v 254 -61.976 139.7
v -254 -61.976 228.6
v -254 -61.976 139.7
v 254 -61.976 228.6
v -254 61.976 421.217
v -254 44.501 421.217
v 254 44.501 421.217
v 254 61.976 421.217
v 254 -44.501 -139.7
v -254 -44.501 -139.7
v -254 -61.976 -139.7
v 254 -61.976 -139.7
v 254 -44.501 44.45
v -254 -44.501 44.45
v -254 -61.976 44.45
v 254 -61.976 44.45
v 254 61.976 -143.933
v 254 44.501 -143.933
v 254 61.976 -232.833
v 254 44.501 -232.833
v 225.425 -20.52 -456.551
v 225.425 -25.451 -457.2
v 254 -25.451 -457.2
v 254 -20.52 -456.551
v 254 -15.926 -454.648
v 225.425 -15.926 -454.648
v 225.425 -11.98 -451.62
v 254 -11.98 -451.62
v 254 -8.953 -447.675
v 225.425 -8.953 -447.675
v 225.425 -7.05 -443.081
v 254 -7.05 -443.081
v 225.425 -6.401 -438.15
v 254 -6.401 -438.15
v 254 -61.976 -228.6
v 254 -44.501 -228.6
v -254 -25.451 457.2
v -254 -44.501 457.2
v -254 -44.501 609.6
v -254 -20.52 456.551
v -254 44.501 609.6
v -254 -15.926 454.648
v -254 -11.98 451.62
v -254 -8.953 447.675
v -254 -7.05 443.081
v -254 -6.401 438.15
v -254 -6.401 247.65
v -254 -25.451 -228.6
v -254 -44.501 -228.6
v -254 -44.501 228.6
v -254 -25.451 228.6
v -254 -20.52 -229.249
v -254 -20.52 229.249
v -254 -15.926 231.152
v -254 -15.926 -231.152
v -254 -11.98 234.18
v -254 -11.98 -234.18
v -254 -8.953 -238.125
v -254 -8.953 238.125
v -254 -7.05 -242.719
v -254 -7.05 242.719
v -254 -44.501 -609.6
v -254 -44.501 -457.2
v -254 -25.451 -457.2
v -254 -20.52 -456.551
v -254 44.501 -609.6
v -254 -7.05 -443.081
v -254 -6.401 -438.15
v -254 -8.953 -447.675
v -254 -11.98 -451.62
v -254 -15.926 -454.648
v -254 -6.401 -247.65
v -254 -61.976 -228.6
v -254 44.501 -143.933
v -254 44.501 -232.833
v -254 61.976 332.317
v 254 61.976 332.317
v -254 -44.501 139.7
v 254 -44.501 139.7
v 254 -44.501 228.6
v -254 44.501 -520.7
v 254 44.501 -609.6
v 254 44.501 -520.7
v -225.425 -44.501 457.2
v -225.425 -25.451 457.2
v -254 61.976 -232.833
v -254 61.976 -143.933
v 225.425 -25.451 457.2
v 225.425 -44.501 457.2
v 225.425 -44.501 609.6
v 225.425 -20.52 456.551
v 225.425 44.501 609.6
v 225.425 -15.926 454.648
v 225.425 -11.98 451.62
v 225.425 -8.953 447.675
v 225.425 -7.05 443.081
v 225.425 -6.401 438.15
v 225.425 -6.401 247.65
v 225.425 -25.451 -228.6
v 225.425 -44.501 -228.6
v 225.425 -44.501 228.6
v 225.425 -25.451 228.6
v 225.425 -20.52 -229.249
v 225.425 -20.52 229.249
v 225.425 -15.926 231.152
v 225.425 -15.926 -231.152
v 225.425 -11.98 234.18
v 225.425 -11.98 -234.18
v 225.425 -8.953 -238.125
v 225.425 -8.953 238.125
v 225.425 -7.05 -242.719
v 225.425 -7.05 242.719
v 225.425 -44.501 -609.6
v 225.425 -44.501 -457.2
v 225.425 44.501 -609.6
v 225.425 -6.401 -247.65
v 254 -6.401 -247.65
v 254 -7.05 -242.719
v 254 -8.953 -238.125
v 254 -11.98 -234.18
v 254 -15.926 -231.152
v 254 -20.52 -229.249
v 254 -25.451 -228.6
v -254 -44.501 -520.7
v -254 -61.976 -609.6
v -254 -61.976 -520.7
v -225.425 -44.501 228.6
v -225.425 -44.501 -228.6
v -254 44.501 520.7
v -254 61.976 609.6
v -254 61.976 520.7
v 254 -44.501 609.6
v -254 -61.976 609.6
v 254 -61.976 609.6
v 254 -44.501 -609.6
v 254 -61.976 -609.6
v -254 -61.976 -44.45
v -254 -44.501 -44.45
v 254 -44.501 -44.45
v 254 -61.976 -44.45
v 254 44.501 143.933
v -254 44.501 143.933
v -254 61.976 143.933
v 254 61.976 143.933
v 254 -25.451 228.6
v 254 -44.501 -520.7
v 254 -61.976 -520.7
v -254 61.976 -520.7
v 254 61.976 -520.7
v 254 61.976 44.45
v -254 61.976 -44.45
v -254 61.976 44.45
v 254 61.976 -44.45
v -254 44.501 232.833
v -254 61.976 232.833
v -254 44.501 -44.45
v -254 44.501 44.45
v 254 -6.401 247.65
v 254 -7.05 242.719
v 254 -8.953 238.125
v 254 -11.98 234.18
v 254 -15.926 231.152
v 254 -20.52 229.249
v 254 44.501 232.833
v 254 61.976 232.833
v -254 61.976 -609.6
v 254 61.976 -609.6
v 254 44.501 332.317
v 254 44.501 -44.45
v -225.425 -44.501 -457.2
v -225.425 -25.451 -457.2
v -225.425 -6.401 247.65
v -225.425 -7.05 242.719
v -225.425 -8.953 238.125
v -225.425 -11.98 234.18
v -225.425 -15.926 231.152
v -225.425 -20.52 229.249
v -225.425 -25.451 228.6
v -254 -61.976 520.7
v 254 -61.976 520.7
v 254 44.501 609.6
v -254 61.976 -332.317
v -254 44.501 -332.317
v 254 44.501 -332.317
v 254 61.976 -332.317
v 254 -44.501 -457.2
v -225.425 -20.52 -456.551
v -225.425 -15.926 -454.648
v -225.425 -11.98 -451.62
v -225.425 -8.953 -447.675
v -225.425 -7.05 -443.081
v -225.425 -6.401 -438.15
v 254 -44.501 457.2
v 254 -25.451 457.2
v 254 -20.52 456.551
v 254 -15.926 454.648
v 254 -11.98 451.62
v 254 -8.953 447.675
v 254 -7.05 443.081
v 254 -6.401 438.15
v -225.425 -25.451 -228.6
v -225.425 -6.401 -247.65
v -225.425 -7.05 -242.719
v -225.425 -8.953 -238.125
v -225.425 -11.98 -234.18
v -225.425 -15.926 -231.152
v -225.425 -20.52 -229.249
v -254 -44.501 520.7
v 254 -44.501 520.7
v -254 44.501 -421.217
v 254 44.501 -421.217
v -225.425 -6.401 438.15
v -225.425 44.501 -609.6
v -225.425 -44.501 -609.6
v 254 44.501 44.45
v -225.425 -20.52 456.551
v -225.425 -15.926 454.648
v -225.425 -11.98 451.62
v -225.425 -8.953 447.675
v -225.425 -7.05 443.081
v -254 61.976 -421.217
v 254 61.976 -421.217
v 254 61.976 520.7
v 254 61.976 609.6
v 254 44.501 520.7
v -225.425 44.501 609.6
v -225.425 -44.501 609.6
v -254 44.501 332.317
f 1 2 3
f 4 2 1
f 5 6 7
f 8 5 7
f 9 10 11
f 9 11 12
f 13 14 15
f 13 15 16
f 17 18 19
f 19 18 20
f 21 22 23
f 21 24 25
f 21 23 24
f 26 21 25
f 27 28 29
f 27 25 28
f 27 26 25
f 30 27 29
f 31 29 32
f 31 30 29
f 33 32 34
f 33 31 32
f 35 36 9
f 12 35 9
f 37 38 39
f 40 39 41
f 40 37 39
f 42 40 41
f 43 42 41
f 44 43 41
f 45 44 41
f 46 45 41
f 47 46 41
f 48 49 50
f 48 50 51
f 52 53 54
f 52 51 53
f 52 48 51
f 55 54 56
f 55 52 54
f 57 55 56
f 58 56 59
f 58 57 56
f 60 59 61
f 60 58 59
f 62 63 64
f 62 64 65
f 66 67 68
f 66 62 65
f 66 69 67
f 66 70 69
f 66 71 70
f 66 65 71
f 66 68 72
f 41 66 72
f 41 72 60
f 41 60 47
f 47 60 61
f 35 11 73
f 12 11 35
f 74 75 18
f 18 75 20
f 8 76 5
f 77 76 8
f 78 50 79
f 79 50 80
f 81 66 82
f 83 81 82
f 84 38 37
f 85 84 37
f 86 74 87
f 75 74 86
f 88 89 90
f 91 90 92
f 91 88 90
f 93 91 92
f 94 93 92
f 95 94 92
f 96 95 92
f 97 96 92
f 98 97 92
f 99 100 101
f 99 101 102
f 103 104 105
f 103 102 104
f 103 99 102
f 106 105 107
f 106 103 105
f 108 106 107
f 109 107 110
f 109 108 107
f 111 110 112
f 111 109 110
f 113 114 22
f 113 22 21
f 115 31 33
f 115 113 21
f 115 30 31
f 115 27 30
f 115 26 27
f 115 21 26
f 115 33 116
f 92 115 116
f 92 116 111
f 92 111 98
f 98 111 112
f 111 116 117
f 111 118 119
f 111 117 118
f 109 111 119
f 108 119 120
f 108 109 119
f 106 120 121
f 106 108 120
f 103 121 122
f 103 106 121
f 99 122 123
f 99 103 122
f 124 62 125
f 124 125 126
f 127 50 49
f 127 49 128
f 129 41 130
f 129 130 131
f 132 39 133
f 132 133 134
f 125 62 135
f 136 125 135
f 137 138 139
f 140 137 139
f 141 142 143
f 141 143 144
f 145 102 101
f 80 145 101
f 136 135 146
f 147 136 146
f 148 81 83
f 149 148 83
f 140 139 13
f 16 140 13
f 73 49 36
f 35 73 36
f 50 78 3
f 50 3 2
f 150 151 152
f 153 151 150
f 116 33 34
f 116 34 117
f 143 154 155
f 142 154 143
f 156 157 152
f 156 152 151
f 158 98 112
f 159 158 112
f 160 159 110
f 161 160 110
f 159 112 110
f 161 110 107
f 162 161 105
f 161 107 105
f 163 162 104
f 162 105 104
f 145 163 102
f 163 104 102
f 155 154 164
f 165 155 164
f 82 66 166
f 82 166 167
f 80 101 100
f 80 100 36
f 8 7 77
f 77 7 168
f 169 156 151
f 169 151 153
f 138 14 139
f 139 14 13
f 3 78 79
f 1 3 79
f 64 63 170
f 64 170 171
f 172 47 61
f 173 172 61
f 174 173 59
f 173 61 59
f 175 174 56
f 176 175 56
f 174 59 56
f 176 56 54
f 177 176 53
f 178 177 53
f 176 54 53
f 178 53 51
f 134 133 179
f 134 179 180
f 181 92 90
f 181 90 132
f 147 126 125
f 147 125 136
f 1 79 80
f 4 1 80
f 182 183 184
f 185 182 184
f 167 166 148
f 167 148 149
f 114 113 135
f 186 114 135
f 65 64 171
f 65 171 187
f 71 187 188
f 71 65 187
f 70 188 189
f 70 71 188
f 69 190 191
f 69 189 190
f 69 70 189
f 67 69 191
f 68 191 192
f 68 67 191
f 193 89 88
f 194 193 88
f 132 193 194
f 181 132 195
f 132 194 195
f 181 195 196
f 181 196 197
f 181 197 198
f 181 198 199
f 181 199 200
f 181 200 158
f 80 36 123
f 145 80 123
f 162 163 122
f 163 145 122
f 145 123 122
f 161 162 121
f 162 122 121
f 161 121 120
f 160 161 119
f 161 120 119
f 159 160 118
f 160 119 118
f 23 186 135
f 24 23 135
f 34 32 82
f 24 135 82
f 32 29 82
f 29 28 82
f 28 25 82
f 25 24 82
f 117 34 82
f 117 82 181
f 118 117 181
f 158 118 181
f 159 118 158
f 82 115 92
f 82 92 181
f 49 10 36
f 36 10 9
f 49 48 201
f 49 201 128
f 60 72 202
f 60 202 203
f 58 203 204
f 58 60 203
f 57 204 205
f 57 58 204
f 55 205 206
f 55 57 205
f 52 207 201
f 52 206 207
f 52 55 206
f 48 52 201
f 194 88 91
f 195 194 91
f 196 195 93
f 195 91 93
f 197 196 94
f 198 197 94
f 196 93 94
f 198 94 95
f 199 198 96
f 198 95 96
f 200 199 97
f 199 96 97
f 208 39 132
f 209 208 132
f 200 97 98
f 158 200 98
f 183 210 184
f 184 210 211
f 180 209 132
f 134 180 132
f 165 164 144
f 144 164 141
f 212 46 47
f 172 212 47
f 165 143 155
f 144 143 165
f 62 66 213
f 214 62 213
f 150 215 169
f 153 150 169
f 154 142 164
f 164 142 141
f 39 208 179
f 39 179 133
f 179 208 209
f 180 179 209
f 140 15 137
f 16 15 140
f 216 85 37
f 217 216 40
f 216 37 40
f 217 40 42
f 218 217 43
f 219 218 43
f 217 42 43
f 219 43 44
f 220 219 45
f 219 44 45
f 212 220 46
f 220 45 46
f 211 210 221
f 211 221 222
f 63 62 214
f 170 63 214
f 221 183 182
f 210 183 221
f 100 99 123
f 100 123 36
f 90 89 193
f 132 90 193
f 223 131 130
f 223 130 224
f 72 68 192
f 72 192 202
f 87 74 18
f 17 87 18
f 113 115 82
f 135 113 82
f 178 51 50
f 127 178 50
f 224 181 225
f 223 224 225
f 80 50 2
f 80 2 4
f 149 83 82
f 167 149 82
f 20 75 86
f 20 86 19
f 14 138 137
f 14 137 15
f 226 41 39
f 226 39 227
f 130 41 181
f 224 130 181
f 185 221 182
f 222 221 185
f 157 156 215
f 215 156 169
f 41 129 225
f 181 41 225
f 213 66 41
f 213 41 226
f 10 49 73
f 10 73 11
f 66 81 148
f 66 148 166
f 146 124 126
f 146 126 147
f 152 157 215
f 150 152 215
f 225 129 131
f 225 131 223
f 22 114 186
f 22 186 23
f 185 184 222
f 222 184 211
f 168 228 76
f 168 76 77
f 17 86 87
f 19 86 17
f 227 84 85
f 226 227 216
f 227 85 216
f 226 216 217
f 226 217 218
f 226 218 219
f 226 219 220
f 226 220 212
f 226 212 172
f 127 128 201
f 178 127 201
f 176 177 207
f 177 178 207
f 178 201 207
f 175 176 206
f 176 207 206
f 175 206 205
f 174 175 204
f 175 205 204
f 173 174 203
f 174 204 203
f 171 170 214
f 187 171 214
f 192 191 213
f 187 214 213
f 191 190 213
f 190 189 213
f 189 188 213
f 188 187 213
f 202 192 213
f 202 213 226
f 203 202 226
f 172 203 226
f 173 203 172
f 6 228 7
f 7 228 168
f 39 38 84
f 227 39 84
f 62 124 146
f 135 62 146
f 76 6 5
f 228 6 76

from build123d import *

# Parameters (mm, degrees)
BOSS_EXTRUDE1_DEPTH        = 609.6
BOSS_EXTRUDE1_DEPTH_BACK   = 609.6
SKETCH3_W                  = 28.575
SKETCH3_H                  = 89.0016
BOSS_EXTRUDE1_2_DEPTH      = 609.6
BOSS_EXTRUDE1_2_DEPTH_BACK = 609.6
SKETCH4_W                  = 508
SKETCH4_H                  = 88.9
BOSS_EXTRUDE2_DEPTH        = 17.4752
BOSS_EXTRUDE2_2_DEPTH      = 17.4752
BOSS_EXTRUDE2_3_DEPTH      = 17.4752
BOSS_EXTRUDE2_4_DEPTH      = 17.4752
BOSS_EXTRUDE2_5_DEPTH      = 17.4752
BOSS_EXTRUDE2_6_DEPTH      = 17.4752
BOSS_EXTRUDE2_7_DEPTH      = 17.4752
SKETCH5_W                  = 508
SKETCH5_H                  = 88.9
BOSS_EXTRUDE3_DEPTH        = 17.4752
BOSS_EXTRUDE3_2_DEPTH      = 17.4752
BOSS_EXTRUDE3_3_DEPTH      = 17.4752
BOSS_EXTRUDE3_4_DEPTH      = 17.4752
BOSS_EXTRUDE3_5_DEPTH      = 17.4752
CUT_EXTRUDE2_DEPTH         = 796.93792759
CUT_EXTRUDE2_DEPTH_BACK    = 796.93792759


with BuildPart() as part:
    # Sketch3 → Boss-Extrude1 (new, two sides: drawn at the far end of the back side and taken through both)
    with BuildSketch(Plane.XY.offset(-BOSS_EXTRUDE1_DEPTH_BACK)):
        with Locations((-239.7125, 0)):
            Rectangle(SKETCH3_W, SKETCH3_H)
    extrude(amount=BOSS_EXTRUDE1_DEPTH + BOSS_EXTRUDE1_DEPTH_BACK)


with BuildPart() as body_2:
    # Sketch3 → Boss-Extrude1 2 (new, two sides: drawn at the far end of the back side and taken through both)
    with BuildSketch(Plane.XY.offset(-BOSS_EXTRUDE1_2_DEPTH_BACK)):
        with Locations((239.7125, 0)):
            Rectangle(SKETCH3_W, SKETCH3_H)
    extrude(amount=BOSS_EXTRUDE1_2_DEPTH + BOSS_EXTRUDE1_2_DEPTH_BACK)


with BuildPart() as body_3:
    # Sketch4 → Boss-Extrude2 (new body)
    with BuildSketch(Plane(origin=(0, 44.5008, 0), x_dir=(1, 0, 0), z_dir=(0, 1, 0))):
        with Locations((0, -565.15)):
            Rectangle(SKETCH4_W, SKETCH4_H)
    extrude(amount=BOSS_EXTRUDE2_DEPTH)


with BuildPart() as body_4:
    # Sketch4 → Boss-Extrude2 2 (new body)
    with BuildSketch(Plane(origin=(0, 44.5008, 0), x_dir=(1, 0, 0), z_dir=(0, 1, 0))):
        with Locations((0, -376.766666667)):
            Rectangle(SKETCH4_W, SKETCH4_H)
    extrude(amount=BOSS_EXTRUDE2_2_DEPTH)


with BuildPart() as body_5:
    # Sketch4 → Boss-Extrude2 3 (new body)
    with BuildSketch(Plane(origin=(0, 44.5008, 0), x_dir=(1, 0, 0), z_dir=(0, 1, 0))):
        with Locations((0, -188.383333333)):
            Rectangle(SKETCH4_W, SKETCH4_H)
    extrude(amount=BOSS_EXTRUDE2_3_DEPTH)


with BuildPart() as body_6:
    # Sketch4 → Boss-Extrude2 4 (new body)
    with BuildSketch(Plane(origin=(0, 44.5008, 0), x_dir=(1, 0, 0), z_dir=(0, 1, 0))):
        Rectangle(SKETCH4_W, SKETCH4_H)
    extrude(amount=BOSS_EXTRUDE2_4_DEPTH)


with BuildPart() as body_7:
    # Sketch4 → Boss-Extrude2 5 (new body)
    with BuildSketch(Plane(origin=(0, 44.5008, 0), x_dir=(1, 0, 0), z_dir=(0, 1, 0))):
        with Locations((0, 188.383333333)):
            Rectangle(SKETCH4_W, SKETCH4_H)
    extrude(amount=BOSS_EXTRUDE2_5_DEPTH)


with BuildPart() as body_8:
    # Sketch4 → Boss-Extrude2 6 (new body)
    with BuildSketch(Plane(origin=(0, 44.5008, 0), x_dir=(1, 0, 0), z_dir=(0, 1, 0))):
        with Locations((0, 376.766666667)):
            Rectangle(SKETCH4_W, SKETCH4_H)
    extrude(amount=BOSS_EXTRUDE2_6_DEPTH)


with BuildPart() as body_9:
    # Sketch4 → Boss-Extrude2 7 (new body)
    with BuildSketch(Plane(origin=(0, 44.5008, 0), x_dir=(1, 0, 0), z_dir=(0, 1, 0))):
        with Locations((0, 565.15)):
            Rectangle(SKETCH4_W, SKETCH4_H)
    extrude(amount=BOSS_EXTRUDE2_7_DEPTH)


with BuildPart() as body_10:
    # Sketch5 → Boss-Extrude3 (new body)
    with BuildSketch(Plane.XZ.offset(44.5008)):
        with Locations((0, 565.15)):
            Rectangle(SKETCH5_W, SKETCH5_H)
    extrude(amount=BOSS_EXTRUDE3_DEPTH)


with BuildPart() as body_11:
    # Sketch5 → Boss-Extrude3 2 (new body)
    with BuildSketch(Plane.XZ.offset(44.5008)):
        with Locations((0, -565.15)):
            Rectangle(SKETCH5_W, SKETCH5_H)
    extrude(amount=BOSS_EXTRUDE3_2_DEPTH)


with BuildPart() as body_12:
    # Sketch5 → Boss-Extrude3 3 (new body)
    with BuildSketch(Plane.XZ.offset(44.5008)):
        Rectangle(SKETCH5_W, SKETCH5_H)
    extrude(amount=BOSS_EXTRUDE3_3_DEPTH)


with BuildPart() as body_13:
    # Sketch5 → Boss-Extrude3 4 (new body)
    with BuildSketch(Plane.XZ.offset(44.5008)):
        with Locations((0, 184.15)):
            Rectangle(SKETCH5_W, SKETCH5_H)
    extrude(amount=BOSS_EXTRUDE3_4_DEPTH)


with BuildPart() as body_14:
    # Sketch5 → Boss-Extrude3 5 (new body)
    with BuildSketch(Plane.XZ.offset(44.5008)):
        with Locations((0, -184.15)):
            Rectangle(SKETCH5_W, SKETCH5_H)
    extrude(amount=BOSS_EXTRUDE3_5_DEPTH)


with BuildPart() as cut_extrude2_tool:
    # Sketch8 → Cut-Extrude2 (new, two sides: drawn at the far end of the back side and taken through both)
    with BuildSketch(Plane(origin=(254, 0, 0), x_dir=(0, 0, -1), z_dir=(1, 0, 0)).offset(-CUT_EXTRUDE2_DEPTH_BACK)):
        with BuildLine():
            Line((-228.6, -44.5008), (-457.2, -44.5008))
            Line((-457.2, -44.5008), (-457.2, -25.4508))
            ThreePointArc((-457.2, -25.4508), (-451.620384182, -11.980415818), (-438.15, -6.4008))
            Line((-438.15, -6.4008), (-247.65, -6.4008))
            ThreePointArc((-247.65, -6.4008), (-234.179615818, -11.980415818), (-228.6, -25.4508))
            Line((-228.6, -25.4508), (-228.6, -44.5008))
        make_face()
        with BuildLine():
            Line((228.6, -44.5008), (457.2, -44.5008))
            Line((457.2, -44.5008), (457.2, -25.4508))
            ThreePointArc((457.2, -25.4508), (451.620384182, -11.980415818), (438.15, -6.4008))
            Line((438.15, -6.4008), (247.65, -6.4008))
            ThreePointArc((247.65, -6.4008), (234.179615818, -11.980415818), (228.6, -25.4508))
            Line((228.6, -25.4508), (228.6, -44.5008))
        make_face()
    extrude(amount=CUT_EXTRUDE2_DEPTH + CUT_EXTRUDE2_DEPTH_BACK)


with BuildPart() as part_1:
    add(part.part)

    # Cut-Extrude2: cut by cut_extrude2_tool
    add(cut_extrude2_tool.part, mode=Mode.SUBTRACT)


with BuildPart() as body_2_1:
    add(body_2.part)

    # Cut-Extrude2: cut by cut_extrude2_tool
    add(cut_extrude2_tool.part, mode=Mode.SUBTRACT)


solid = Compound([body_3.part, body_4.part, body_5.part, body_6.part, body_7.part, body_8.part, body_9.part, body_10.part, body_11.part, body_12.part, body_13.part, body_14.part, part_1.part, body_2_1.part])
